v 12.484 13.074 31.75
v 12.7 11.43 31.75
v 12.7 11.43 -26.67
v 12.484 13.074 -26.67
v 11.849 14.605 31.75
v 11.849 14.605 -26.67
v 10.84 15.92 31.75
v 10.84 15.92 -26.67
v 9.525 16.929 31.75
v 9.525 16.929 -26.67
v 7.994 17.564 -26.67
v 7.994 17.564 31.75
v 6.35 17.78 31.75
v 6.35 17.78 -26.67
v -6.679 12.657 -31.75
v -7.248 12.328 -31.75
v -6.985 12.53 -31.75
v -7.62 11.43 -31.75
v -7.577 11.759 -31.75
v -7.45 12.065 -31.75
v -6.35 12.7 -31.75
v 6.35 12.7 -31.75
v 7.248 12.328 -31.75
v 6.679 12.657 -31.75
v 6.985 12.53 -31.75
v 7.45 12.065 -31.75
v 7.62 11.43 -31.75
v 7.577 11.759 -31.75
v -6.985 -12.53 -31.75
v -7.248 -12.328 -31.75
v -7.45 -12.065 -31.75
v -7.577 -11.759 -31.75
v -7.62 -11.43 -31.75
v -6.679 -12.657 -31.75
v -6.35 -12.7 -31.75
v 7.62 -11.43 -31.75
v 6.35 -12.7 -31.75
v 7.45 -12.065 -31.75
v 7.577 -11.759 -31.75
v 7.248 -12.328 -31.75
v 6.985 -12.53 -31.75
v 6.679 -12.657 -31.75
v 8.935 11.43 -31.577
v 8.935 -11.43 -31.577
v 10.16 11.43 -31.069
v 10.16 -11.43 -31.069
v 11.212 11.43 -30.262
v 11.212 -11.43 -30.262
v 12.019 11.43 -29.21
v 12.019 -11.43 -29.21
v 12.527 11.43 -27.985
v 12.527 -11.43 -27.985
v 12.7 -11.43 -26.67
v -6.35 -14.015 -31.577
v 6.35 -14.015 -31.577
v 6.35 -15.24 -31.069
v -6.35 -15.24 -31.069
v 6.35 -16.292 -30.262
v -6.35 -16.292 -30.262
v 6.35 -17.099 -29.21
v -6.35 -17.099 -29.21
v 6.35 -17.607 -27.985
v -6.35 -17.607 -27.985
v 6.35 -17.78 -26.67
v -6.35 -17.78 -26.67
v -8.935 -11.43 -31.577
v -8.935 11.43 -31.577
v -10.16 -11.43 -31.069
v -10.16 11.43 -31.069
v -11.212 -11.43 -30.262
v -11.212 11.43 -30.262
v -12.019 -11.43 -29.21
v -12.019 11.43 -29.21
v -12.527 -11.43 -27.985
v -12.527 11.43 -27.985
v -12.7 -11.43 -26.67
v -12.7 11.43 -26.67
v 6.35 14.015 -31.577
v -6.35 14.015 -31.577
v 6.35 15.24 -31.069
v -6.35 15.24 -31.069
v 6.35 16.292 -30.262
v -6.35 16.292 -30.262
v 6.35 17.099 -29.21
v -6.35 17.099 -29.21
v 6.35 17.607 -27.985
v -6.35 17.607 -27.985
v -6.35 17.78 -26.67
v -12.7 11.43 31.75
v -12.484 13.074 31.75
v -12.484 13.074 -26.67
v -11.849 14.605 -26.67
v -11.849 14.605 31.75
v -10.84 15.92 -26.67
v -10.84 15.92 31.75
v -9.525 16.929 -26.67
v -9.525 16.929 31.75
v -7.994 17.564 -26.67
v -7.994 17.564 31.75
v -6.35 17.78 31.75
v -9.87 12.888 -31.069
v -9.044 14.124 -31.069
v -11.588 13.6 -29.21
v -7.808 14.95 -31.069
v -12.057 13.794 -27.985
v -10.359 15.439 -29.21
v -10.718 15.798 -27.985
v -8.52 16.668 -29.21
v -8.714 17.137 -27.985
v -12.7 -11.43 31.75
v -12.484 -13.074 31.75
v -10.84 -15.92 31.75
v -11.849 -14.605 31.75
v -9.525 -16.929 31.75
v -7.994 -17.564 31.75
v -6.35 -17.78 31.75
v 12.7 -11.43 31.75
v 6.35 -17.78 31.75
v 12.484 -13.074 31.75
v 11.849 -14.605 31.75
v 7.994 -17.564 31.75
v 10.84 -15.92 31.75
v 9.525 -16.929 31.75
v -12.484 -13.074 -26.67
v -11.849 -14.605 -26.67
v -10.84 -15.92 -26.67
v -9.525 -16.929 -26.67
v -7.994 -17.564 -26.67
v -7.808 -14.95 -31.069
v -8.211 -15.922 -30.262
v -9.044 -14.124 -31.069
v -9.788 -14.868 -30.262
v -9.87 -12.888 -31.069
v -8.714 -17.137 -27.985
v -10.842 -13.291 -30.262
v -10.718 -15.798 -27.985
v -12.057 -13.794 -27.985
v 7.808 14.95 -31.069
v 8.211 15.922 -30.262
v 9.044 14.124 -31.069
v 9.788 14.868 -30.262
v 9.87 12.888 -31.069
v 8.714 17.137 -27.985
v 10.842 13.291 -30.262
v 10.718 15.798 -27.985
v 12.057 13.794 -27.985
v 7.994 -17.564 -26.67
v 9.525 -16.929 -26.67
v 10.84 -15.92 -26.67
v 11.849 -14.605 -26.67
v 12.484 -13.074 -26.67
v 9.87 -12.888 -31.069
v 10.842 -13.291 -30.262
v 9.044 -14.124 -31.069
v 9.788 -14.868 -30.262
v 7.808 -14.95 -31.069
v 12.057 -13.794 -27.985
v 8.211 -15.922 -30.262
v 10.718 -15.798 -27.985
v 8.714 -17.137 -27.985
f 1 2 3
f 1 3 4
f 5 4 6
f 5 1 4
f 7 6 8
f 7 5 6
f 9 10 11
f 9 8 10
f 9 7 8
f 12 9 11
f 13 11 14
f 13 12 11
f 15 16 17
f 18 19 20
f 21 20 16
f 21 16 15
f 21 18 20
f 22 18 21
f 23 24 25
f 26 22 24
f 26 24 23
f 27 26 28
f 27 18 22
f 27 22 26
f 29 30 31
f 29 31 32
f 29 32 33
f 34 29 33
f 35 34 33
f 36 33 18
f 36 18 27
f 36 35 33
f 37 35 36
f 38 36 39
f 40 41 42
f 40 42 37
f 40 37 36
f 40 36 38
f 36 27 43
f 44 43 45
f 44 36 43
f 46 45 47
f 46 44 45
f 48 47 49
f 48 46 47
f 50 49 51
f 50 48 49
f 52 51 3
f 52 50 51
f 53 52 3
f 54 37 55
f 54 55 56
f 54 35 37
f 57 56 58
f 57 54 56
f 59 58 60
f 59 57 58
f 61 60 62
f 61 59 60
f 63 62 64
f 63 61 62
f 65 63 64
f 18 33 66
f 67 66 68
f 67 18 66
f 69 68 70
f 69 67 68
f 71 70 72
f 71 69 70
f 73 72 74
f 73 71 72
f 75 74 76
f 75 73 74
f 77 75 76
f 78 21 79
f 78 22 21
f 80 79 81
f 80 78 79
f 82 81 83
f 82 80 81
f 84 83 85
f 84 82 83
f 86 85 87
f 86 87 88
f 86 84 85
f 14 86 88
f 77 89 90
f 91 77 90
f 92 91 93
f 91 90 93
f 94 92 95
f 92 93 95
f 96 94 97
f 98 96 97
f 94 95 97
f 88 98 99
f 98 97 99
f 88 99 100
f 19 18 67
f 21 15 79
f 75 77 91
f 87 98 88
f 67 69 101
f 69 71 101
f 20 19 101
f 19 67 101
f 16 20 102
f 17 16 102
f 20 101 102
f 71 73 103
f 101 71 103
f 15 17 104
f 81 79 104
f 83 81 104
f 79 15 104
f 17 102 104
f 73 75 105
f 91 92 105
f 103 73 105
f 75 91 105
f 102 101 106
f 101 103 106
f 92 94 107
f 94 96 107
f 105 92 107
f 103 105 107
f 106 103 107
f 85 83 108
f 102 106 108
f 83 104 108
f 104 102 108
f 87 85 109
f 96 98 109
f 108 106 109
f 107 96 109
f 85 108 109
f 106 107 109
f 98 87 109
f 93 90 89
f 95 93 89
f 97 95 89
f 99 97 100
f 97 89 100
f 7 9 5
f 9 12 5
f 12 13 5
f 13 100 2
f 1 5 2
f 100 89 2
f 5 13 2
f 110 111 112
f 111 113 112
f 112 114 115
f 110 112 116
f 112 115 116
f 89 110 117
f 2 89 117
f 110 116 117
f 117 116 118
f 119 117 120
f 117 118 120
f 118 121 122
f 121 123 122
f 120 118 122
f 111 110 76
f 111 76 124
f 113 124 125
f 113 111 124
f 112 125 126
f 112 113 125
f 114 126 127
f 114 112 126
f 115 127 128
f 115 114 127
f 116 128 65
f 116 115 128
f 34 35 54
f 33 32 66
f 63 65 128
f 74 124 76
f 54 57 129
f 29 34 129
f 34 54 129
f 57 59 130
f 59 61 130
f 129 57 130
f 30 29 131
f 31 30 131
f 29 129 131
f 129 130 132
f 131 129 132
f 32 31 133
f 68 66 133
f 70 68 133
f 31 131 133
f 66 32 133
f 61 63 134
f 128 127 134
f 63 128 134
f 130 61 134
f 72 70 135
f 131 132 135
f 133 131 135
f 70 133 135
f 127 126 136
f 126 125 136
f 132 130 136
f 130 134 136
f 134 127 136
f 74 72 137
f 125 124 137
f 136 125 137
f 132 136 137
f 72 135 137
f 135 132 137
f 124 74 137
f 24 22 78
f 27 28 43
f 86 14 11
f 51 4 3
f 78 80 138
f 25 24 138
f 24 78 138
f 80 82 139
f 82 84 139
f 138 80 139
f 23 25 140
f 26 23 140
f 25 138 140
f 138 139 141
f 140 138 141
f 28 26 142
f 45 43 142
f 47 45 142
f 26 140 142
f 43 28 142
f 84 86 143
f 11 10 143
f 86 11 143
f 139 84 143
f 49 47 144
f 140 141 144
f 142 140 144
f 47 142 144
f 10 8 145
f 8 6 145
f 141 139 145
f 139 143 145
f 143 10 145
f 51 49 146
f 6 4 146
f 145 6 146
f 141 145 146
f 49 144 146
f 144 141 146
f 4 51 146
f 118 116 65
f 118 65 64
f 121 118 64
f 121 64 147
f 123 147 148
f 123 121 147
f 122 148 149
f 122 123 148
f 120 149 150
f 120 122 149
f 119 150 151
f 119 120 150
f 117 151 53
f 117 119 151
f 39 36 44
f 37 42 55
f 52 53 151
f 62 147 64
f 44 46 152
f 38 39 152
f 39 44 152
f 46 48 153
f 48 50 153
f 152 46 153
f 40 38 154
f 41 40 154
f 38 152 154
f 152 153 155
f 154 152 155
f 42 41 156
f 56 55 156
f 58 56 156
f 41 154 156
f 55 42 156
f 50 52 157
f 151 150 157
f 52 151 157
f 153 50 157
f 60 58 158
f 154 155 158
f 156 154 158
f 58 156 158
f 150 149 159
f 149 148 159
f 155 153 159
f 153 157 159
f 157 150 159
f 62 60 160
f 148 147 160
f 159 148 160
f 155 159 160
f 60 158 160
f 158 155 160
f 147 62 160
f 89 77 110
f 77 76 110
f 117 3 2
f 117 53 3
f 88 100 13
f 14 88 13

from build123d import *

# Parameters (mm, degrees)
F0_W     = 25.4
F0_H     = 63.5
F1_DEPTH = 17.78
F2_R     = 6.35
F3_R     = 5.08


with BuildPart() as f1:
    # F0 (on Front) → F1 (new body, symmetric)
    with BuildSketch(Plane.XZ):
        Rectangle(F0_W, F0_H)
    extrude(amount=F1_DEPTH, both=True)

    # F2
    f2_edges = [f1.edges().sort_by_distance(p)[0] for p in [
        (-12.7, -17.78, 0),
        (-12.7, 17.78, 0),
        (12.7, 17.78, 0),
        (12.7, -17.78, 0),
    ]]
    fillet(f2_edges, radius=F2_R)

    # F3
    f3_edges = [f1.edges().sort_by_distance(p)[0] for p in [
        (0, 17.78, -31.75),
        (-10.840128, 15.920128, -31.75),
        (10.840128, 15.920128, -31.75),
        (-12.7, 0, -31.75),
        (12.7, 0, -31.75),
        (-10.840128, -15.920128, -31.75),
        (10.840128, -15.920128, -31.75),
        (0, -17.78, -31.75),
    ]]
    fillet(f3_edges, radius=F3_R)


solid = f1.part
